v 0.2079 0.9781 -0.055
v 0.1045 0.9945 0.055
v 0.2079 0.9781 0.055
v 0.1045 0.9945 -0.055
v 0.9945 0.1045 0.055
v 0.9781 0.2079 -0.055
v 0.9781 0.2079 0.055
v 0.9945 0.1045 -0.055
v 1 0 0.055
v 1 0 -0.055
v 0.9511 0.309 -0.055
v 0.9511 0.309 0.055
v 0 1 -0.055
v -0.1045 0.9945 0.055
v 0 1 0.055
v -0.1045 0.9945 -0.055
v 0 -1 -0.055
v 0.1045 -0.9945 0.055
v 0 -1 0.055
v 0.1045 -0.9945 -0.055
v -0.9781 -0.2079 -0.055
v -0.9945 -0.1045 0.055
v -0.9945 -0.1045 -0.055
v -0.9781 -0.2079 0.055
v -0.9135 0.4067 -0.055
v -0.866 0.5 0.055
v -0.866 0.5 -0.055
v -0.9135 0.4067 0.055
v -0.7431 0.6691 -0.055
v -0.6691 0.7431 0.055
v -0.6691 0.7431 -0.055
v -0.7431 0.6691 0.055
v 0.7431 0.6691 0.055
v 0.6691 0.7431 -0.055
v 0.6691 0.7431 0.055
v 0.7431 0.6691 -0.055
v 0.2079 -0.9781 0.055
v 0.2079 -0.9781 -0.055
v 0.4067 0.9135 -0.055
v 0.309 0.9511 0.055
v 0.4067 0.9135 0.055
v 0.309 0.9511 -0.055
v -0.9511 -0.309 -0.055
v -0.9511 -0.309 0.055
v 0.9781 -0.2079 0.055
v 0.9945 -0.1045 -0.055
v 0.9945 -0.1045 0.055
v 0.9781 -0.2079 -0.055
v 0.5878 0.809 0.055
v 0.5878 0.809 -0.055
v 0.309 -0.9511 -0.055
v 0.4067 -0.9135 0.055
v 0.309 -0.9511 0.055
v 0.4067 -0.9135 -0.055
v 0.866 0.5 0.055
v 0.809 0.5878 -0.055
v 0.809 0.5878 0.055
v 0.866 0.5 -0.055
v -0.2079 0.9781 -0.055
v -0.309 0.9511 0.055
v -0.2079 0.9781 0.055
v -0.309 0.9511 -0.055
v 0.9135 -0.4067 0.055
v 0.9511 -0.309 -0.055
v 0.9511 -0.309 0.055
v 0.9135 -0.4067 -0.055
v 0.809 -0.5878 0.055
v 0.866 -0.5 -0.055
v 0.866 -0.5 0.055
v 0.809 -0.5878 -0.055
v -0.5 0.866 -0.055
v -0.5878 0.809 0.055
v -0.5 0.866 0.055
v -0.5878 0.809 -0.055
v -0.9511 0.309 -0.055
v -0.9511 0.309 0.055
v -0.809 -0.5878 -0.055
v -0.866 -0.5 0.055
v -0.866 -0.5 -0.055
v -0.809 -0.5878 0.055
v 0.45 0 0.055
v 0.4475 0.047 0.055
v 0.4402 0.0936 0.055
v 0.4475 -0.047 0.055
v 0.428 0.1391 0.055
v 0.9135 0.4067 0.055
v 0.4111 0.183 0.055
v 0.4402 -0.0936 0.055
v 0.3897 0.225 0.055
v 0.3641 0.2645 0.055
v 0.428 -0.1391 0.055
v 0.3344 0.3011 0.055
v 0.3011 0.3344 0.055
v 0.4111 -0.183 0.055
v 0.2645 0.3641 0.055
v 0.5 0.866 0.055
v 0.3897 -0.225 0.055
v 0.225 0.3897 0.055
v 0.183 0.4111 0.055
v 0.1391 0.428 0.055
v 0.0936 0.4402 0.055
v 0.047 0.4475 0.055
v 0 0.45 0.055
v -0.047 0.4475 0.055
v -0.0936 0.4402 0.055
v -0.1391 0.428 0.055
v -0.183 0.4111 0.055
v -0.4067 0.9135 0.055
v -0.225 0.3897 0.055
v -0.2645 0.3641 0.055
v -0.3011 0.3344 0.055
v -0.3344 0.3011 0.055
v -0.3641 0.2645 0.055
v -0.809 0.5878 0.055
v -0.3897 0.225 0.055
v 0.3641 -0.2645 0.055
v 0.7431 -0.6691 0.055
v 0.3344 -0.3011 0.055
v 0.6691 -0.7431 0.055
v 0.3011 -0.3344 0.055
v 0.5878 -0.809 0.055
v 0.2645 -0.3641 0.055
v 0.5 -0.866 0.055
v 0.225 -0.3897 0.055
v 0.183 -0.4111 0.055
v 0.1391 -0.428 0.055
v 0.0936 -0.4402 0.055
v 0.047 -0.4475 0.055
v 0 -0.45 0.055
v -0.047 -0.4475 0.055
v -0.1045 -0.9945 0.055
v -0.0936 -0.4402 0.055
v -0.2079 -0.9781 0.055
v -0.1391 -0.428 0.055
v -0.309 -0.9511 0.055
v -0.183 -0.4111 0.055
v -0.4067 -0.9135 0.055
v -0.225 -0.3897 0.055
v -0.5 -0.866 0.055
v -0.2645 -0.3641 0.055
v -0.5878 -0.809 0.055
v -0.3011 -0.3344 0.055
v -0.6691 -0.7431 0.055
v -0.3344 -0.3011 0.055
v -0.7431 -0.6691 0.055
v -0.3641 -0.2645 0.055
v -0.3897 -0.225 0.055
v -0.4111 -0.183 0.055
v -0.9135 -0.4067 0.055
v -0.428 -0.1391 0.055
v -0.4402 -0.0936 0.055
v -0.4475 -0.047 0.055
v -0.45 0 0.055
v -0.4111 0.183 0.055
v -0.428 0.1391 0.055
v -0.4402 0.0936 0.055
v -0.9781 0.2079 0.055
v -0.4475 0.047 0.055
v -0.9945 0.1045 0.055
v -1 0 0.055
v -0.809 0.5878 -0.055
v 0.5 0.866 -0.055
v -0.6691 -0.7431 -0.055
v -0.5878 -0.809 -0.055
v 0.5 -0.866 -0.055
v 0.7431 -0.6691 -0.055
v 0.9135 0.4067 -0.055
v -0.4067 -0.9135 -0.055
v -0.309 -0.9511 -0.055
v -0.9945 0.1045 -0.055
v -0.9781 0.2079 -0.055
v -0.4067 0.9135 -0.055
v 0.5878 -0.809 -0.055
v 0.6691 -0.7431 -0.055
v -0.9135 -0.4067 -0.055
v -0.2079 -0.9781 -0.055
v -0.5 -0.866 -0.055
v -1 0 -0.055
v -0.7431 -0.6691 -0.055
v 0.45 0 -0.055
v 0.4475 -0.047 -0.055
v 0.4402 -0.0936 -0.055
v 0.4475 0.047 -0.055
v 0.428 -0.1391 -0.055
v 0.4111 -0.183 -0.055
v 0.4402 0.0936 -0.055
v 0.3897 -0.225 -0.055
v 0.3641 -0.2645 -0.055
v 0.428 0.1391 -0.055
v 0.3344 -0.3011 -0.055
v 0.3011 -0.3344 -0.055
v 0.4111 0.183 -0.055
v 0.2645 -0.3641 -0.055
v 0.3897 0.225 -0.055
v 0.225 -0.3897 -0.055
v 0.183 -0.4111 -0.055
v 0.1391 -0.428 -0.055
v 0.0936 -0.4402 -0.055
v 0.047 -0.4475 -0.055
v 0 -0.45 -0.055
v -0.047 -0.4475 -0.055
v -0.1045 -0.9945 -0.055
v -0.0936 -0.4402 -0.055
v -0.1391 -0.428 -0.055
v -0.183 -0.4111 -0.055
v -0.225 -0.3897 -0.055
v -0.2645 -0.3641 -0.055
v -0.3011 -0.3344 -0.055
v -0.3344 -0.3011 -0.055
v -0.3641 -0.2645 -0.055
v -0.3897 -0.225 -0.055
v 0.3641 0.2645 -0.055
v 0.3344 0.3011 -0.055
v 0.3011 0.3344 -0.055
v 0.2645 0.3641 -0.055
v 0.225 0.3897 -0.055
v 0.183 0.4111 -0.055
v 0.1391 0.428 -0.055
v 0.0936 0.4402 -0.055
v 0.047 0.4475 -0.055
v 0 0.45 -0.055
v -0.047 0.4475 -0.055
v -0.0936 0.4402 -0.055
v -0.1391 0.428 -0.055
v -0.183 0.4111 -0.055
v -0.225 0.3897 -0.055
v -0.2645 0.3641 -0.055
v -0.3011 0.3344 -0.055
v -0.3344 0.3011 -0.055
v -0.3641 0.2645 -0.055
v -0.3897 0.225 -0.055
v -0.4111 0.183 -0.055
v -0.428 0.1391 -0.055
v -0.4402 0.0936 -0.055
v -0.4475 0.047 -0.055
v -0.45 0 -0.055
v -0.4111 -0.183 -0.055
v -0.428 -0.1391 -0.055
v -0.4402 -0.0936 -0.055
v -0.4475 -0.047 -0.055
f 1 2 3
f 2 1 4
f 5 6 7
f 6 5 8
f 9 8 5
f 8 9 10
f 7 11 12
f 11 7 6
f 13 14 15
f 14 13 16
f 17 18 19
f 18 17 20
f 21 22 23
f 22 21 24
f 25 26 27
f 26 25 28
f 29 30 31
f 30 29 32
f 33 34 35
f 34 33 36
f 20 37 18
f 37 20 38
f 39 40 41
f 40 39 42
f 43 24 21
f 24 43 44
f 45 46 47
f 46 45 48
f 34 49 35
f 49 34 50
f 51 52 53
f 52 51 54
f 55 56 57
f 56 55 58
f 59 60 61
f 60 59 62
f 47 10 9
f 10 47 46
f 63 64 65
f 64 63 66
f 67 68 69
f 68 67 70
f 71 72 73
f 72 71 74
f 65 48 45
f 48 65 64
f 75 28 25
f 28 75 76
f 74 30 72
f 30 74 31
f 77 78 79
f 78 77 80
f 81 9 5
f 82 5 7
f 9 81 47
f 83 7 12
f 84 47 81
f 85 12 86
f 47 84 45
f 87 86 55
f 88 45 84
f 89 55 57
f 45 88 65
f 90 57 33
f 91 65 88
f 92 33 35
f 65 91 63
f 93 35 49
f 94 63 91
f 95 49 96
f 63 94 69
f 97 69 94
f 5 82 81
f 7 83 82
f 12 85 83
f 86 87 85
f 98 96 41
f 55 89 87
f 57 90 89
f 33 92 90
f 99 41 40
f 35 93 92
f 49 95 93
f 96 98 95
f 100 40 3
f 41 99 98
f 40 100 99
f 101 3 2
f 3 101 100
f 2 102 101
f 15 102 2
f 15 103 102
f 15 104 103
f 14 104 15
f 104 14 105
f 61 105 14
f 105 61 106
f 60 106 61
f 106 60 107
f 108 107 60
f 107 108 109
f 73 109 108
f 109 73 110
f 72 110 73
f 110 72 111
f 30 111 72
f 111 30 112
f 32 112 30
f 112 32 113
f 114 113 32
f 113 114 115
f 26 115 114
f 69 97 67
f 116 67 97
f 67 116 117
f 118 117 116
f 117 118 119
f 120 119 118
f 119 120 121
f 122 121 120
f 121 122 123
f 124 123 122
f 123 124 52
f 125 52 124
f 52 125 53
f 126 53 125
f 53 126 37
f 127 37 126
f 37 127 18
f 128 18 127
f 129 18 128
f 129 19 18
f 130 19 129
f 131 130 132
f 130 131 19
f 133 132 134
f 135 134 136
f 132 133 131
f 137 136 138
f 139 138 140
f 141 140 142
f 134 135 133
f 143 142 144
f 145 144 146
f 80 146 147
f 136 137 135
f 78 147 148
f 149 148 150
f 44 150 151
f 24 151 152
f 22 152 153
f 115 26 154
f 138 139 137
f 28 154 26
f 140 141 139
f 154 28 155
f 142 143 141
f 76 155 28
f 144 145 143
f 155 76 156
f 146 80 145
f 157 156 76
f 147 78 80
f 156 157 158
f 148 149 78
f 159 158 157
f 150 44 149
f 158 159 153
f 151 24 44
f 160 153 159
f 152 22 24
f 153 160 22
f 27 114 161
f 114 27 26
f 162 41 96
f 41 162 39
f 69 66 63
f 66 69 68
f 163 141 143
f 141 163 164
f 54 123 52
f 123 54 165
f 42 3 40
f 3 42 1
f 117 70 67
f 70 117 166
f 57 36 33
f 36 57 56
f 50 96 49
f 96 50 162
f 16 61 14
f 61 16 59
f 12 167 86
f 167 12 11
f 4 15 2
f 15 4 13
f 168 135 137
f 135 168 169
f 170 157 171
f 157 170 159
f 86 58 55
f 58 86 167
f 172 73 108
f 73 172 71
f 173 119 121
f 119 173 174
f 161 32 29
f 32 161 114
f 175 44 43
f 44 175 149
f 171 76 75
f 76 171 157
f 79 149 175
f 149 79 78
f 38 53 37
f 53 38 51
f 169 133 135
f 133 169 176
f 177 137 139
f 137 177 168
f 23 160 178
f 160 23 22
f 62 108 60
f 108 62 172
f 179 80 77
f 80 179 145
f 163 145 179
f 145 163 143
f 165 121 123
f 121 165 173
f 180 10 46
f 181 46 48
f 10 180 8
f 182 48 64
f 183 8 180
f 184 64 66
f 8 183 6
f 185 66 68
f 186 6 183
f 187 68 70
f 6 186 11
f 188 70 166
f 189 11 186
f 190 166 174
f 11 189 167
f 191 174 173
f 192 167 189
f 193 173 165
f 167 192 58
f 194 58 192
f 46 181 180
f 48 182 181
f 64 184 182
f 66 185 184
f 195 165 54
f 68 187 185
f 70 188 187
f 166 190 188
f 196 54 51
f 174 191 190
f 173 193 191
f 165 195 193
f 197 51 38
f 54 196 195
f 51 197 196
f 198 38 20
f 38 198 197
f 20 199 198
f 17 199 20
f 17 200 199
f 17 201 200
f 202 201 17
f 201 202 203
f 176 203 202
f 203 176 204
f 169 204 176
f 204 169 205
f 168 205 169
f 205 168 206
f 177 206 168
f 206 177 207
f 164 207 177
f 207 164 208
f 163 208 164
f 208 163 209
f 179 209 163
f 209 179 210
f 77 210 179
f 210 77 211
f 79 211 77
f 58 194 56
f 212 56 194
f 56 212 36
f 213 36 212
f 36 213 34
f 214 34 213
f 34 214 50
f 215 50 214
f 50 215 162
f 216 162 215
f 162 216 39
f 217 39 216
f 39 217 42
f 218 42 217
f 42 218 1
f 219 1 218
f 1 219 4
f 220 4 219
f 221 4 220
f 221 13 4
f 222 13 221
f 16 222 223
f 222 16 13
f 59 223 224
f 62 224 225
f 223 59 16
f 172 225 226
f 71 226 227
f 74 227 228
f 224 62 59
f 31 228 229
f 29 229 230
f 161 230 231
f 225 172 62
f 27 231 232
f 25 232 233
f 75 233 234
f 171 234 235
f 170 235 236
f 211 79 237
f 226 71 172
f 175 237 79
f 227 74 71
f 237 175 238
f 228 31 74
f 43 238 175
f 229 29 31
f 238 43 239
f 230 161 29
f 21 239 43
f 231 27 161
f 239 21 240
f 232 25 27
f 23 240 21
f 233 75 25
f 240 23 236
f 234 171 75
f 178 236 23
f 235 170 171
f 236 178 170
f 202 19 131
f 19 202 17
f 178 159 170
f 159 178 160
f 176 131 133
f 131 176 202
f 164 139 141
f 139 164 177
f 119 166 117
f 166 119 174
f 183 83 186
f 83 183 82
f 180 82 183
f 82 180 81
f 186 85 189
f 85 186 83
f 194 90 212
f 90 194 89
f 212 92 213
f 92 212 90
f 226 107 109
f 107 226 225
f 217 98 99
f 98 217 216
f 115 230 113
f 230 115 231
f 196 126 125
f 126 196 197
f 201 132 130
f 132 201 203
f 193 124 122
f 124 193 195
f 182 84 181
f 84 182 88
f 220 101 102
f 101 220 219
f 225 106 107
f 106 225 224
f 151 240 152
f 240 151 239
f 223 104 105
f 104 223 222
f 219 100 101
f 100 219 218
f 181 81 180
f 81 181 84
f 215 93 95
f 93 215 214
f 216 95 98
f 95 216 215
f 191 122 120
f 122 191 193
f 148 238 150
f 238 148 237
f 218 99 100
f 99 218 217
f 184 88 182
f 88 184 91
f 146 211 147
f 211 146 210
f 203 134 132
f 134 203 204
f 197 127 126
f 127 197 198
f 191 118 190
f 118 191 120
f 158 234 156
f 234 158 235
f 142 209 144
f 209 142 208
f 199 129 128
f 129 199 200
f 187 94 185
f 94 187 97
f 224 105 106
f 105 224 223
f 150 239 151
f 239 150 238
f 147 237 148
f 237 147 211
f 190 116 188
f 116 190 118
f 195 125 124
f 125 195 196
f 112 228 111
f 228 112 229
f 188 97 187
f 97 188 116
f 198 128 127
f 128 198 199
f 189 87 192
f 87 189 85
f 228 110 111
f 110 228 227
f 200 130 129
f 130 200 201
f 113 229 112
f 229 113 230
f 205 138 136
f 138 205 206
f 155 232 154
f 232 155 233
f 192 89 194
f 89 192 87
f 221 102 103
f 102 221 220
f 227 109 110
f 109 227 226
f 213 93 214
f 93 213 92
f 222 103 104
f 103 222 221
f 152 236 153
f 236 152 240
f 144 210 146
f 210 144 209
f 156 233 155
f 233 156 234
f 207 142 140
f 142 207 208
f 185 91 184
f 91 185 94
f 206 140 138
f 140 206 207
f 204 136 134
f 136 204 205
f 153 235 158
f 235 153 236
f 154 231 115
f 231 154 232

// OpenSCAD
// Ring used in both the ColorTool geometry and the ColorToolIcon.

module ColorToolRing() {
  difference() {
    cylinder(r = 1,   h = .11, center = true);
    cylinder(r = .45, h = .2, center = true);
  }
}

ColorToolRing($fn = 60);
